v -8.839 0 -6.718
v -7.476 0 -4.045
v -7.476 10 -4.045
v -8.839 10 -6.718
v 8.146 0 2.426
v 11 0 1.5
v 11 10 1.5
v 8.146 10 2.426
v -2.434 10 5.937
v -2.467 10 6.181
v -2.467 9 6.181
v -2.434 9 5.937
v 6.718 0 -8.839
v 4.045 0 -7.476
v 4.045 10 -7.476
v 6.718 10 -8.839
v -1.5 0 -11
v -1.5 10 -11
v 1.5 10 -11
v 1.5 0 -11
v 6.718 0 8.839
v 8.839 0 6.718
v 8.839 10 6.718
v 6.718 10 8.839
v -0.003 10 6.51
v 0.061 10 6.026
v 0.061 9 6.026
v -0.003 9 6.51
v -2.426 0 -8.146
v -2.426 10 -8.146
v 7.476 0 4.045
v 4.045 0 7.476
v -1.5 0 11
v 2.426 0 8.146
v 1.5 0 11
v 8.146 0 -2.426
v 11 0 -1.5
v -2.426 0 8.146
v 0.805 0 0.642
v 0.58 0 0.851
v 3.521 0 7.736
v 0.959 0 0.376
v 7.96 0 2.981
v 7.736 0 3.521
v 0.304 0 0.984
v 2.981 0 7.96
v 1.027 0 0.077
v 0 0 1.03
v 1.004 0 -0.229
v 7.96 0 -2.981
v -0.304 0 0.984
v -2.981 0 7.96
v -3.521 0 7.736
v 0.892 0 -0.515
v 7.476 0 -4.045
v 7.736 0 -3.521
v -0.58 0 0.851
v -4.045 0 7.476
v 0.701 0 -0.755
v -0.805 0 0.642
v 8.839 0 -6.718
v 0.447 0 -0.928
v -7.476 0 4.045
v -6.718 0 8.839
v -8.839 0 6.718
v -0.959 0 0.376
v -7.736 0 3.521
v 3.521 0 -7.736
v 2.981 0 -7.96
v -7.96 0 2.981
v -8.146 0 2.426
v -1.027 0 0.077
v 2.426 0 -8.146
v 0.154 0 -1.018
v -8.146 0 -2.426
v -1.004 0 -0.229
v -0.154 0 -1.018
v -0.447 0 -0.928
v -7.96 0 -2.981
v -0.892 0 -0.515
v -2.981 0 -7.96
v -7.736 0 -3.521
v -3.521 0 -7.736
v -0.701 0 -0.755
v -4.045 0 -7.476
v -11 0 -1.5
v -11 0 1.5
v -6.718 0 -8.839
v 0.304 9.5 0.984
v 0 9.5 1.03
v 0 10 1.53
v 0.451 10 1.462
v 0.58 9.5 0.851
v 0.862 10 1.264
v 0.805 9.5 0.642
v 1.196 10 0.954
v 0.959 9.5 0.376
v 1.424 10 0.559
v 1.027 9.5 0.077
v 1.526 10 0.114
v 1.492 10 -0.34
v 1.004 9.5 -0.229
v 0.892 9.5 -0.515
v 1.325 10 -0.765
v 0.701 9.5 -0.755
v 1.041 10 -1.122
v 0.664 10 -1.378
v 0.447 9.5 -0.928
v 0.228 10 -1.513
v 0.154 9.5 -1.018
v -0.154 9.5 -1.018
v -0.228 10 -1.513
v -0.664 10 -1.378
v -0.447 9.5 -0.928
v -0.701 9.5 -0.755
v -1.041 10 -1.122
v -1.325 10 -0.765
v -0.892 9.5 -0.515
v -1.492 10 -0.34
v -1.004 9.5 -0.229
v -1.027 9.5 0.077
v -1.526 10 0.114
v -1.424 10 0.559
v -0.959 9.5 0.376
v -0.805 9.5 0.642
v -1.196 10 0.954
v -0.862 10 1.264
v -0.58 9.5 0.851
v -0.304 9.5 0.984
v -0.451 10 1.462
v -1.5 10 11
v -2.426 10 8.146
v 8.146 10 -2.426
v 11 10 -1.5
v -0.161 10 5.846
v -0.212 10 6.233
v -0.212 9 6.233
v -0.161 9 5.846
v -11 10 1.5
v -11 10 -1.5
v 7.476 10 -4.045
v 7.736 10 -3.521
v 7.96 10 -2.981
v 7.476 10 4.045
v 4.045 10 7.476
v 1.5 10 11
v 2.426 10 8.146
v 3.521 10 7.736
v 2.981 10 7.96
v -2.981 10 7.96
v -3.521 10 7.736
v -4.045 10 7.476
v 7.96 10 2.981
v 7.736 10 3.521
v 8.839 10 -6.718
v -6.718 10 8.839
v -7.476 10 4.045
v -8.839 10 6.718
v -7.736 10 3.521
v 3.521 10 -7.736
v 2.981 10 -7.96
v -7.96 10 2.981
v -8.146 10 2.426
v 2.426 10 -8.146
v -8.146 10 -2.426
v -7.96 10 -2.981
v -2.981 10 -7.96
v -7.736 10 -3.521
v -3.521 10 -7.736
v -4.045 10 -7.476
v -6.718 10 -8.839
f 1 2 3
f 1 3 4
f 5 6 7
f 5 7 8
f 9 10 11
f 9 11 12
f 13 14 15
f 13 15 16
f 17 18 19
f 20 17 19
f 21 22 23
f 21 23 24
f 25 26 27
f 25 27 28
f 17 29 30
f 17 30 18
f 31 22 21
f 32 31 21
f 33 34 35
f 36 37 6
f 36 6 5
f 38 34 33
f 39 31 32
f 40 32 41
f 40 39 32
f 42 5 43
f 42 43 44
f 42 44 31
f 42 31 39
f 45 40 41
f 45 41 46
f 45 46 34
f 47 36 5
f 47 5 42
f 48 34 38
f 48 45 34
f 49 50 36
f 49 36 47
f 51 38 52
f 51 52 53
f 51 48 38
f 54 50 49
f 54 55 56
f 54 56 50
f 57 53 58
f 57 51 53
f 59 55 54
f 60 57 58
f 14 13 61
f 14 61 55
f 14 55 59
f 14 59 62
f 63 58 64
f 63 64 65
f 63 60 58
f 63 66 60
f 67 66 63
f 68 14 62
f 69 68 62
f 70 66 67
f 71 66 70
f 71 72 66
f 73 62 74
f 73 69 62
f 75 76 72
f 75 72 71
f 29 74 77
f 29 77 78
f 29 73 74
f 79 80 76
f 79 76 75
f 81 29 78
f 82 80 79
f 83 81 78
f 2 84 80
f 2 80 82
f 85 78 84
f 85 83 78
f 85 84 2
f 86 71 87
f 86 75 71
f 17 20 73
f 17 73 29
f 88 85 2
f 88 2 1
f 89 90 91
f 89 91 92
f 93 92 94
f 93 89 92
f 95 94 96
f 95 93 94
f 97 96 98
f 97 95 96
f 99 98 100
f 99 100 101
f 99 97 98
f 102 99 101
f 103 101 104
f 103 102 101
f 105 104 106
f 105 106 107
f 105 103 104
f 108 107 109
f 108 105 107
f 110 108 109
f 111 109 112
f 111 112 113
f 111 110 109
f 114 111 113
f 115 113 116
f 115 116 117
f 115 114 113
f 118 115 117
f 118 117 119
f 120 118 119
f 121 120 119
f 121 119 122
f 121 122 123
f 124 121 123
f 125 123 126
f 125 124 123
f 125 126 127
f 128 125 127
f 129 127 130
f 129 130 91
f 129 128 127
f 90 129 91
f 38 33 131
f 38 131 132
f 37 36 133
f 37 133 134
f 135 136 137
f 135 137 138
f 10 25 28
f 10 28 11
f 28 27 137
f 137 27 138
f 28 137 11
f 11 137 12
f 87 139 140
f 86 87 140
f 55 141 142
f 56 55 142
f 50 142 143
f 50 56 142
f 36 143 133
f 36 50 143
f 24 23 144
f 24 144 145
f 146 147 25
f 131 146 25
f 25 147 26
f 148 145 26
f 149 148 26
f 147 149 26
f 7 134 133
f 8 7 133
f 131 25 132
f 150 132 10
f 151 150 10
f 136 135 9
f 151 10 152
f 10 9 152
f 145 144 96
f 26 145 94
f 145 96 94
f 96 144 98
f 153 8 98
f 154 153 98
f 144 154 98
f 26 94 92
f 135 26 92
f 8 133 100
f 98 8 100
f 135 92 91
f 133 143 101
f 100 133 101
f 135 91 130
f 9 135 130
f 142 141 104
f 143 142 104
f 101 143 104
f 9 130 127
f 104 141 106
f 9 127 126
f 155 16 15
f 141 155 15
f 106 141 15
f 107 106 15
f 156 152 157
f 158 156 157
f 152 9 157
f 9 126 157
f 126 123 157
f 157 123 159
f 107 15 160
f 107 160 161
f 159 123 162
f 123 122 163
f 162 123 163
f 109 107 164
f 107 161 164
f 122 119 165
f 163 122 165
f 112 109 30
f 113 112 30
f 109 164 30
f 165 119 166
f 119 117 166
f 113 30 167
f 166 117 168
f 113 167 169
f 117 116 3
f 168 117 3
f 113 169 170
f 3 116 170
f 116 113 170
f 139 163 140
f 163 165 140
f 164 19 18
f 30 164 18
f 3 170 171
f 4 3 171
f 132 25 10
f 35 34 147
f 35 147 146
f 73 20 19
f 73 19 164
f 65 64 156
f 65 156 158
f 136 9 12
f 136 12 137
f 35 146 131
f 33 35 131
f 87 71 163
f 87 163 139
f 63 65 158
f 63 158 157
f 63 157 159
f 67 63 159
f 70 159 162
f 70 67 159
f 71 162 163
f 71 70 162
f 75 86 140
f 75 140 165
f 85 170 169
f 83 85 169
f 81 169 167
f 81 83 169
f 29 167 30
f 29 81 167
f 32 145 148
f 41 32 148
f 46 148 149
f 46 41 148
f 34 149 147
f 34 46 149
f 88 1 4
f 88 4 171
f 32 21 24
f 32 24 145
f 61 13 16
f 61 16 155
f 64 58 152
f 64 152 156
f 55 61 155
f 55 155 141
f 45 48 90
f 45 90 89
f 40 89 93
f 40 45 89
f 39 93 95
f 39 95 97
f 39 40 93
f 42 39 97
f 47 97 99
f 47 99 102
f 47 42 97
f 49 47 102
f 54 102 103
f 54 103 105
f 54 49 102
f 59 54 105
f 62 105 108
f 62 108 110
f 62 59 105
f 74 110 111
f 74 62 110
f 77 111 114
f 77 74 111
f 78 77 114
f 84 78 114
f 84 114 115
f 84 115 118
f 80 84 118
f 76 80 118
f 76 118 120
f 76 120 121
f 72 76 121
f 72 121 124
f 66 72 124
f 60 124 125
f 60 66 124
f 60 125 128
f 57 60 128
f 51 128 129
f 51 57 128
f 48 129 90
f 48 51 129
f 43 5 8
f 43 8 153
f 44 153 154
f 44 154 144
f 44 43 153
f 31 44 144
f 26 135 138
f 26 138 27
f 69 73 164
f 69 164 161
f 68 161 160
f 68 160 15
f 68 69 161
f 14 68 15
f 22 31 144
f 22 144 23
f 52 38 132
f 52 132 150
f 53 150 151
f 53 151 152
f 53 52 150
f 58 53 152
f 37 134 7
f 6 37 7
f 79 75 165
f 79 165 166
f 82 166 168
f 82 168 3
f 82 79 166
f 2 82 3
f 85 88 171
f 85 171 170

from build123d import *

# Parameters (mm, degrees)
SKETCH1_R           = 1.03
BOSS_EXTRUDE1_DEPTH = 10
CUT_EXTRUDE1_DEPTH  = 1
CHAMFER1_SIZE       = 0.5


with BuildPart() as part:
    # Sketch1 → Boss-Extrude1 (new body)
    with BuildSketch(Plane(origin=(0, 0, 0), x_dir=(1, 0, 0), z_dir=(0, 1, 0))):
        with BuildLine():
            Line((-1.5, 11), (1.5, 11))
            Line((1.5, 11), (2.425924848, 8.146464793))
            ThreePointArc((2.425924848, 8.146464793), (3.252809175, 7.852976026), (4.045032587, 7.475808409))
            Line((4.045032587, 7.475808409), (6.717514421, 8.838834765))
            Line((6.717514421, 8.838834765), (8.838834765, 6.717514421))
            Line((8.838834765, 6.717514421), (7.475808409, 4.045032587))
            ThreePointArc((7.475808409, 4.045032587), (7.852976026, 3.252809175), (8.146464793, 2.425924848))
            Line((8.146464793, 2.425924848), (11, 1.5))
            Line((11, 1.5), (11, -1.5))
            Line((11, -1.5), (8.146464793, -2.425924848))
            ThreePointArc((8.146464793, -2.425924848), (7.852976026, -3.252809175), (7.475808409, -4.045032587))
            Line((7.475808409, -4.045032587), (8.838834765, -6.717514421))
            Line((8.838834765, -6.717514421), (6.717514421, -8.838834765))
            Line((6.717514421, -8.838834765), (4.045032587, -7.475808409))
            ThreePointArc((4.045032587, -7.475808409), (3.252809175, -7.852976026), (2.425924848, -8.146464793))
            Line((2.425924848, -8.146464793), (1.5, -11))
            Line((1.5, -11), (-1.5, -11))
            Line((-1.5, -11), (-2.425924848, -8.146464793))
            ThreePointArc((-2.425924848, -8.146464793), (-3.252809175, -7.852976026), (-4.045032587, -7.475808409))
            Line((-4.045032587, -7.475808409), (-6.717514421, -8.838834765))
            Line((-6.717514421, -8.838834765), (-8.838834765, -6.717514421))
            Line((-8.838834765, -6.717514421), (-7.475808409, -4.045032587))
            ThreePointArc((-7.475808409, -4.045032587), (-7.852976026, -3.252809175), (-8.146464793, -2.425924848))
            Line((-8.146464793, -2.425924848), (-11, -1.5))
            Line((-11, -1.5), (-11, 1.5))
            Line((-11, 1.5), (-8.146464793, 2.425924848))
            ThreePointArc((-8.146464793, 2.425924848), (-7.852976026, 3.252809175), (-7.475808409, 4.045032587))
            Line((-7.475808409, 4.045032587), (-8.838834765, 6.717514421))
            Line((-8.838834765, 6.717514421), (-6.717514421, 8.838834765))
            Line((-6.717514421, 8.838834765), (-4.045032587, 7.475808409))
            ThreePointArc((-4.045032587, 7.475808409), (-3.252809175, 7.852976026), (-2.425924848, 8.146464793))
            Line((-2.425924848, 8.146464793), (-1.5, 11))
        make_face()
        with Locations(Location((0, 0, 0), (0, 0, 270))):
            Circle(SKETCH1_R, mode=Mode.SUBTRACT)
    extrude(amount=BOSS_EXTRUDE1_DEPTH)

    # Sketch2 → Cut-Extrude1 (cut)
    with BuildSketch(Plane(origin=(0, 10, 0), x_dir=(1, 0, 0), z_dir=(0, 1, 0))):
        Polygon((0.061172217, -6.025718493), (-0.003431149, -6.509993333), (-2.466872655, -6.181467692), (-2.434320572, -5.936575865), (-0.212265283, -6.233050224), (-0.160682751, -5.846431634), align=None)
    extrude(amount=-CUT_EXTRUDE1_DEPTH, mode=Mode.SUBTRACT)

    # Chamfer1
    chamfer1_edges = [part.edges().sort_by_distance(p)[0] for p in [
        (0, 10, -1.03),
    ]]
    chamfer(chamfer1_edges, length=CHAMFER1_SIZE)


solid = part.part
